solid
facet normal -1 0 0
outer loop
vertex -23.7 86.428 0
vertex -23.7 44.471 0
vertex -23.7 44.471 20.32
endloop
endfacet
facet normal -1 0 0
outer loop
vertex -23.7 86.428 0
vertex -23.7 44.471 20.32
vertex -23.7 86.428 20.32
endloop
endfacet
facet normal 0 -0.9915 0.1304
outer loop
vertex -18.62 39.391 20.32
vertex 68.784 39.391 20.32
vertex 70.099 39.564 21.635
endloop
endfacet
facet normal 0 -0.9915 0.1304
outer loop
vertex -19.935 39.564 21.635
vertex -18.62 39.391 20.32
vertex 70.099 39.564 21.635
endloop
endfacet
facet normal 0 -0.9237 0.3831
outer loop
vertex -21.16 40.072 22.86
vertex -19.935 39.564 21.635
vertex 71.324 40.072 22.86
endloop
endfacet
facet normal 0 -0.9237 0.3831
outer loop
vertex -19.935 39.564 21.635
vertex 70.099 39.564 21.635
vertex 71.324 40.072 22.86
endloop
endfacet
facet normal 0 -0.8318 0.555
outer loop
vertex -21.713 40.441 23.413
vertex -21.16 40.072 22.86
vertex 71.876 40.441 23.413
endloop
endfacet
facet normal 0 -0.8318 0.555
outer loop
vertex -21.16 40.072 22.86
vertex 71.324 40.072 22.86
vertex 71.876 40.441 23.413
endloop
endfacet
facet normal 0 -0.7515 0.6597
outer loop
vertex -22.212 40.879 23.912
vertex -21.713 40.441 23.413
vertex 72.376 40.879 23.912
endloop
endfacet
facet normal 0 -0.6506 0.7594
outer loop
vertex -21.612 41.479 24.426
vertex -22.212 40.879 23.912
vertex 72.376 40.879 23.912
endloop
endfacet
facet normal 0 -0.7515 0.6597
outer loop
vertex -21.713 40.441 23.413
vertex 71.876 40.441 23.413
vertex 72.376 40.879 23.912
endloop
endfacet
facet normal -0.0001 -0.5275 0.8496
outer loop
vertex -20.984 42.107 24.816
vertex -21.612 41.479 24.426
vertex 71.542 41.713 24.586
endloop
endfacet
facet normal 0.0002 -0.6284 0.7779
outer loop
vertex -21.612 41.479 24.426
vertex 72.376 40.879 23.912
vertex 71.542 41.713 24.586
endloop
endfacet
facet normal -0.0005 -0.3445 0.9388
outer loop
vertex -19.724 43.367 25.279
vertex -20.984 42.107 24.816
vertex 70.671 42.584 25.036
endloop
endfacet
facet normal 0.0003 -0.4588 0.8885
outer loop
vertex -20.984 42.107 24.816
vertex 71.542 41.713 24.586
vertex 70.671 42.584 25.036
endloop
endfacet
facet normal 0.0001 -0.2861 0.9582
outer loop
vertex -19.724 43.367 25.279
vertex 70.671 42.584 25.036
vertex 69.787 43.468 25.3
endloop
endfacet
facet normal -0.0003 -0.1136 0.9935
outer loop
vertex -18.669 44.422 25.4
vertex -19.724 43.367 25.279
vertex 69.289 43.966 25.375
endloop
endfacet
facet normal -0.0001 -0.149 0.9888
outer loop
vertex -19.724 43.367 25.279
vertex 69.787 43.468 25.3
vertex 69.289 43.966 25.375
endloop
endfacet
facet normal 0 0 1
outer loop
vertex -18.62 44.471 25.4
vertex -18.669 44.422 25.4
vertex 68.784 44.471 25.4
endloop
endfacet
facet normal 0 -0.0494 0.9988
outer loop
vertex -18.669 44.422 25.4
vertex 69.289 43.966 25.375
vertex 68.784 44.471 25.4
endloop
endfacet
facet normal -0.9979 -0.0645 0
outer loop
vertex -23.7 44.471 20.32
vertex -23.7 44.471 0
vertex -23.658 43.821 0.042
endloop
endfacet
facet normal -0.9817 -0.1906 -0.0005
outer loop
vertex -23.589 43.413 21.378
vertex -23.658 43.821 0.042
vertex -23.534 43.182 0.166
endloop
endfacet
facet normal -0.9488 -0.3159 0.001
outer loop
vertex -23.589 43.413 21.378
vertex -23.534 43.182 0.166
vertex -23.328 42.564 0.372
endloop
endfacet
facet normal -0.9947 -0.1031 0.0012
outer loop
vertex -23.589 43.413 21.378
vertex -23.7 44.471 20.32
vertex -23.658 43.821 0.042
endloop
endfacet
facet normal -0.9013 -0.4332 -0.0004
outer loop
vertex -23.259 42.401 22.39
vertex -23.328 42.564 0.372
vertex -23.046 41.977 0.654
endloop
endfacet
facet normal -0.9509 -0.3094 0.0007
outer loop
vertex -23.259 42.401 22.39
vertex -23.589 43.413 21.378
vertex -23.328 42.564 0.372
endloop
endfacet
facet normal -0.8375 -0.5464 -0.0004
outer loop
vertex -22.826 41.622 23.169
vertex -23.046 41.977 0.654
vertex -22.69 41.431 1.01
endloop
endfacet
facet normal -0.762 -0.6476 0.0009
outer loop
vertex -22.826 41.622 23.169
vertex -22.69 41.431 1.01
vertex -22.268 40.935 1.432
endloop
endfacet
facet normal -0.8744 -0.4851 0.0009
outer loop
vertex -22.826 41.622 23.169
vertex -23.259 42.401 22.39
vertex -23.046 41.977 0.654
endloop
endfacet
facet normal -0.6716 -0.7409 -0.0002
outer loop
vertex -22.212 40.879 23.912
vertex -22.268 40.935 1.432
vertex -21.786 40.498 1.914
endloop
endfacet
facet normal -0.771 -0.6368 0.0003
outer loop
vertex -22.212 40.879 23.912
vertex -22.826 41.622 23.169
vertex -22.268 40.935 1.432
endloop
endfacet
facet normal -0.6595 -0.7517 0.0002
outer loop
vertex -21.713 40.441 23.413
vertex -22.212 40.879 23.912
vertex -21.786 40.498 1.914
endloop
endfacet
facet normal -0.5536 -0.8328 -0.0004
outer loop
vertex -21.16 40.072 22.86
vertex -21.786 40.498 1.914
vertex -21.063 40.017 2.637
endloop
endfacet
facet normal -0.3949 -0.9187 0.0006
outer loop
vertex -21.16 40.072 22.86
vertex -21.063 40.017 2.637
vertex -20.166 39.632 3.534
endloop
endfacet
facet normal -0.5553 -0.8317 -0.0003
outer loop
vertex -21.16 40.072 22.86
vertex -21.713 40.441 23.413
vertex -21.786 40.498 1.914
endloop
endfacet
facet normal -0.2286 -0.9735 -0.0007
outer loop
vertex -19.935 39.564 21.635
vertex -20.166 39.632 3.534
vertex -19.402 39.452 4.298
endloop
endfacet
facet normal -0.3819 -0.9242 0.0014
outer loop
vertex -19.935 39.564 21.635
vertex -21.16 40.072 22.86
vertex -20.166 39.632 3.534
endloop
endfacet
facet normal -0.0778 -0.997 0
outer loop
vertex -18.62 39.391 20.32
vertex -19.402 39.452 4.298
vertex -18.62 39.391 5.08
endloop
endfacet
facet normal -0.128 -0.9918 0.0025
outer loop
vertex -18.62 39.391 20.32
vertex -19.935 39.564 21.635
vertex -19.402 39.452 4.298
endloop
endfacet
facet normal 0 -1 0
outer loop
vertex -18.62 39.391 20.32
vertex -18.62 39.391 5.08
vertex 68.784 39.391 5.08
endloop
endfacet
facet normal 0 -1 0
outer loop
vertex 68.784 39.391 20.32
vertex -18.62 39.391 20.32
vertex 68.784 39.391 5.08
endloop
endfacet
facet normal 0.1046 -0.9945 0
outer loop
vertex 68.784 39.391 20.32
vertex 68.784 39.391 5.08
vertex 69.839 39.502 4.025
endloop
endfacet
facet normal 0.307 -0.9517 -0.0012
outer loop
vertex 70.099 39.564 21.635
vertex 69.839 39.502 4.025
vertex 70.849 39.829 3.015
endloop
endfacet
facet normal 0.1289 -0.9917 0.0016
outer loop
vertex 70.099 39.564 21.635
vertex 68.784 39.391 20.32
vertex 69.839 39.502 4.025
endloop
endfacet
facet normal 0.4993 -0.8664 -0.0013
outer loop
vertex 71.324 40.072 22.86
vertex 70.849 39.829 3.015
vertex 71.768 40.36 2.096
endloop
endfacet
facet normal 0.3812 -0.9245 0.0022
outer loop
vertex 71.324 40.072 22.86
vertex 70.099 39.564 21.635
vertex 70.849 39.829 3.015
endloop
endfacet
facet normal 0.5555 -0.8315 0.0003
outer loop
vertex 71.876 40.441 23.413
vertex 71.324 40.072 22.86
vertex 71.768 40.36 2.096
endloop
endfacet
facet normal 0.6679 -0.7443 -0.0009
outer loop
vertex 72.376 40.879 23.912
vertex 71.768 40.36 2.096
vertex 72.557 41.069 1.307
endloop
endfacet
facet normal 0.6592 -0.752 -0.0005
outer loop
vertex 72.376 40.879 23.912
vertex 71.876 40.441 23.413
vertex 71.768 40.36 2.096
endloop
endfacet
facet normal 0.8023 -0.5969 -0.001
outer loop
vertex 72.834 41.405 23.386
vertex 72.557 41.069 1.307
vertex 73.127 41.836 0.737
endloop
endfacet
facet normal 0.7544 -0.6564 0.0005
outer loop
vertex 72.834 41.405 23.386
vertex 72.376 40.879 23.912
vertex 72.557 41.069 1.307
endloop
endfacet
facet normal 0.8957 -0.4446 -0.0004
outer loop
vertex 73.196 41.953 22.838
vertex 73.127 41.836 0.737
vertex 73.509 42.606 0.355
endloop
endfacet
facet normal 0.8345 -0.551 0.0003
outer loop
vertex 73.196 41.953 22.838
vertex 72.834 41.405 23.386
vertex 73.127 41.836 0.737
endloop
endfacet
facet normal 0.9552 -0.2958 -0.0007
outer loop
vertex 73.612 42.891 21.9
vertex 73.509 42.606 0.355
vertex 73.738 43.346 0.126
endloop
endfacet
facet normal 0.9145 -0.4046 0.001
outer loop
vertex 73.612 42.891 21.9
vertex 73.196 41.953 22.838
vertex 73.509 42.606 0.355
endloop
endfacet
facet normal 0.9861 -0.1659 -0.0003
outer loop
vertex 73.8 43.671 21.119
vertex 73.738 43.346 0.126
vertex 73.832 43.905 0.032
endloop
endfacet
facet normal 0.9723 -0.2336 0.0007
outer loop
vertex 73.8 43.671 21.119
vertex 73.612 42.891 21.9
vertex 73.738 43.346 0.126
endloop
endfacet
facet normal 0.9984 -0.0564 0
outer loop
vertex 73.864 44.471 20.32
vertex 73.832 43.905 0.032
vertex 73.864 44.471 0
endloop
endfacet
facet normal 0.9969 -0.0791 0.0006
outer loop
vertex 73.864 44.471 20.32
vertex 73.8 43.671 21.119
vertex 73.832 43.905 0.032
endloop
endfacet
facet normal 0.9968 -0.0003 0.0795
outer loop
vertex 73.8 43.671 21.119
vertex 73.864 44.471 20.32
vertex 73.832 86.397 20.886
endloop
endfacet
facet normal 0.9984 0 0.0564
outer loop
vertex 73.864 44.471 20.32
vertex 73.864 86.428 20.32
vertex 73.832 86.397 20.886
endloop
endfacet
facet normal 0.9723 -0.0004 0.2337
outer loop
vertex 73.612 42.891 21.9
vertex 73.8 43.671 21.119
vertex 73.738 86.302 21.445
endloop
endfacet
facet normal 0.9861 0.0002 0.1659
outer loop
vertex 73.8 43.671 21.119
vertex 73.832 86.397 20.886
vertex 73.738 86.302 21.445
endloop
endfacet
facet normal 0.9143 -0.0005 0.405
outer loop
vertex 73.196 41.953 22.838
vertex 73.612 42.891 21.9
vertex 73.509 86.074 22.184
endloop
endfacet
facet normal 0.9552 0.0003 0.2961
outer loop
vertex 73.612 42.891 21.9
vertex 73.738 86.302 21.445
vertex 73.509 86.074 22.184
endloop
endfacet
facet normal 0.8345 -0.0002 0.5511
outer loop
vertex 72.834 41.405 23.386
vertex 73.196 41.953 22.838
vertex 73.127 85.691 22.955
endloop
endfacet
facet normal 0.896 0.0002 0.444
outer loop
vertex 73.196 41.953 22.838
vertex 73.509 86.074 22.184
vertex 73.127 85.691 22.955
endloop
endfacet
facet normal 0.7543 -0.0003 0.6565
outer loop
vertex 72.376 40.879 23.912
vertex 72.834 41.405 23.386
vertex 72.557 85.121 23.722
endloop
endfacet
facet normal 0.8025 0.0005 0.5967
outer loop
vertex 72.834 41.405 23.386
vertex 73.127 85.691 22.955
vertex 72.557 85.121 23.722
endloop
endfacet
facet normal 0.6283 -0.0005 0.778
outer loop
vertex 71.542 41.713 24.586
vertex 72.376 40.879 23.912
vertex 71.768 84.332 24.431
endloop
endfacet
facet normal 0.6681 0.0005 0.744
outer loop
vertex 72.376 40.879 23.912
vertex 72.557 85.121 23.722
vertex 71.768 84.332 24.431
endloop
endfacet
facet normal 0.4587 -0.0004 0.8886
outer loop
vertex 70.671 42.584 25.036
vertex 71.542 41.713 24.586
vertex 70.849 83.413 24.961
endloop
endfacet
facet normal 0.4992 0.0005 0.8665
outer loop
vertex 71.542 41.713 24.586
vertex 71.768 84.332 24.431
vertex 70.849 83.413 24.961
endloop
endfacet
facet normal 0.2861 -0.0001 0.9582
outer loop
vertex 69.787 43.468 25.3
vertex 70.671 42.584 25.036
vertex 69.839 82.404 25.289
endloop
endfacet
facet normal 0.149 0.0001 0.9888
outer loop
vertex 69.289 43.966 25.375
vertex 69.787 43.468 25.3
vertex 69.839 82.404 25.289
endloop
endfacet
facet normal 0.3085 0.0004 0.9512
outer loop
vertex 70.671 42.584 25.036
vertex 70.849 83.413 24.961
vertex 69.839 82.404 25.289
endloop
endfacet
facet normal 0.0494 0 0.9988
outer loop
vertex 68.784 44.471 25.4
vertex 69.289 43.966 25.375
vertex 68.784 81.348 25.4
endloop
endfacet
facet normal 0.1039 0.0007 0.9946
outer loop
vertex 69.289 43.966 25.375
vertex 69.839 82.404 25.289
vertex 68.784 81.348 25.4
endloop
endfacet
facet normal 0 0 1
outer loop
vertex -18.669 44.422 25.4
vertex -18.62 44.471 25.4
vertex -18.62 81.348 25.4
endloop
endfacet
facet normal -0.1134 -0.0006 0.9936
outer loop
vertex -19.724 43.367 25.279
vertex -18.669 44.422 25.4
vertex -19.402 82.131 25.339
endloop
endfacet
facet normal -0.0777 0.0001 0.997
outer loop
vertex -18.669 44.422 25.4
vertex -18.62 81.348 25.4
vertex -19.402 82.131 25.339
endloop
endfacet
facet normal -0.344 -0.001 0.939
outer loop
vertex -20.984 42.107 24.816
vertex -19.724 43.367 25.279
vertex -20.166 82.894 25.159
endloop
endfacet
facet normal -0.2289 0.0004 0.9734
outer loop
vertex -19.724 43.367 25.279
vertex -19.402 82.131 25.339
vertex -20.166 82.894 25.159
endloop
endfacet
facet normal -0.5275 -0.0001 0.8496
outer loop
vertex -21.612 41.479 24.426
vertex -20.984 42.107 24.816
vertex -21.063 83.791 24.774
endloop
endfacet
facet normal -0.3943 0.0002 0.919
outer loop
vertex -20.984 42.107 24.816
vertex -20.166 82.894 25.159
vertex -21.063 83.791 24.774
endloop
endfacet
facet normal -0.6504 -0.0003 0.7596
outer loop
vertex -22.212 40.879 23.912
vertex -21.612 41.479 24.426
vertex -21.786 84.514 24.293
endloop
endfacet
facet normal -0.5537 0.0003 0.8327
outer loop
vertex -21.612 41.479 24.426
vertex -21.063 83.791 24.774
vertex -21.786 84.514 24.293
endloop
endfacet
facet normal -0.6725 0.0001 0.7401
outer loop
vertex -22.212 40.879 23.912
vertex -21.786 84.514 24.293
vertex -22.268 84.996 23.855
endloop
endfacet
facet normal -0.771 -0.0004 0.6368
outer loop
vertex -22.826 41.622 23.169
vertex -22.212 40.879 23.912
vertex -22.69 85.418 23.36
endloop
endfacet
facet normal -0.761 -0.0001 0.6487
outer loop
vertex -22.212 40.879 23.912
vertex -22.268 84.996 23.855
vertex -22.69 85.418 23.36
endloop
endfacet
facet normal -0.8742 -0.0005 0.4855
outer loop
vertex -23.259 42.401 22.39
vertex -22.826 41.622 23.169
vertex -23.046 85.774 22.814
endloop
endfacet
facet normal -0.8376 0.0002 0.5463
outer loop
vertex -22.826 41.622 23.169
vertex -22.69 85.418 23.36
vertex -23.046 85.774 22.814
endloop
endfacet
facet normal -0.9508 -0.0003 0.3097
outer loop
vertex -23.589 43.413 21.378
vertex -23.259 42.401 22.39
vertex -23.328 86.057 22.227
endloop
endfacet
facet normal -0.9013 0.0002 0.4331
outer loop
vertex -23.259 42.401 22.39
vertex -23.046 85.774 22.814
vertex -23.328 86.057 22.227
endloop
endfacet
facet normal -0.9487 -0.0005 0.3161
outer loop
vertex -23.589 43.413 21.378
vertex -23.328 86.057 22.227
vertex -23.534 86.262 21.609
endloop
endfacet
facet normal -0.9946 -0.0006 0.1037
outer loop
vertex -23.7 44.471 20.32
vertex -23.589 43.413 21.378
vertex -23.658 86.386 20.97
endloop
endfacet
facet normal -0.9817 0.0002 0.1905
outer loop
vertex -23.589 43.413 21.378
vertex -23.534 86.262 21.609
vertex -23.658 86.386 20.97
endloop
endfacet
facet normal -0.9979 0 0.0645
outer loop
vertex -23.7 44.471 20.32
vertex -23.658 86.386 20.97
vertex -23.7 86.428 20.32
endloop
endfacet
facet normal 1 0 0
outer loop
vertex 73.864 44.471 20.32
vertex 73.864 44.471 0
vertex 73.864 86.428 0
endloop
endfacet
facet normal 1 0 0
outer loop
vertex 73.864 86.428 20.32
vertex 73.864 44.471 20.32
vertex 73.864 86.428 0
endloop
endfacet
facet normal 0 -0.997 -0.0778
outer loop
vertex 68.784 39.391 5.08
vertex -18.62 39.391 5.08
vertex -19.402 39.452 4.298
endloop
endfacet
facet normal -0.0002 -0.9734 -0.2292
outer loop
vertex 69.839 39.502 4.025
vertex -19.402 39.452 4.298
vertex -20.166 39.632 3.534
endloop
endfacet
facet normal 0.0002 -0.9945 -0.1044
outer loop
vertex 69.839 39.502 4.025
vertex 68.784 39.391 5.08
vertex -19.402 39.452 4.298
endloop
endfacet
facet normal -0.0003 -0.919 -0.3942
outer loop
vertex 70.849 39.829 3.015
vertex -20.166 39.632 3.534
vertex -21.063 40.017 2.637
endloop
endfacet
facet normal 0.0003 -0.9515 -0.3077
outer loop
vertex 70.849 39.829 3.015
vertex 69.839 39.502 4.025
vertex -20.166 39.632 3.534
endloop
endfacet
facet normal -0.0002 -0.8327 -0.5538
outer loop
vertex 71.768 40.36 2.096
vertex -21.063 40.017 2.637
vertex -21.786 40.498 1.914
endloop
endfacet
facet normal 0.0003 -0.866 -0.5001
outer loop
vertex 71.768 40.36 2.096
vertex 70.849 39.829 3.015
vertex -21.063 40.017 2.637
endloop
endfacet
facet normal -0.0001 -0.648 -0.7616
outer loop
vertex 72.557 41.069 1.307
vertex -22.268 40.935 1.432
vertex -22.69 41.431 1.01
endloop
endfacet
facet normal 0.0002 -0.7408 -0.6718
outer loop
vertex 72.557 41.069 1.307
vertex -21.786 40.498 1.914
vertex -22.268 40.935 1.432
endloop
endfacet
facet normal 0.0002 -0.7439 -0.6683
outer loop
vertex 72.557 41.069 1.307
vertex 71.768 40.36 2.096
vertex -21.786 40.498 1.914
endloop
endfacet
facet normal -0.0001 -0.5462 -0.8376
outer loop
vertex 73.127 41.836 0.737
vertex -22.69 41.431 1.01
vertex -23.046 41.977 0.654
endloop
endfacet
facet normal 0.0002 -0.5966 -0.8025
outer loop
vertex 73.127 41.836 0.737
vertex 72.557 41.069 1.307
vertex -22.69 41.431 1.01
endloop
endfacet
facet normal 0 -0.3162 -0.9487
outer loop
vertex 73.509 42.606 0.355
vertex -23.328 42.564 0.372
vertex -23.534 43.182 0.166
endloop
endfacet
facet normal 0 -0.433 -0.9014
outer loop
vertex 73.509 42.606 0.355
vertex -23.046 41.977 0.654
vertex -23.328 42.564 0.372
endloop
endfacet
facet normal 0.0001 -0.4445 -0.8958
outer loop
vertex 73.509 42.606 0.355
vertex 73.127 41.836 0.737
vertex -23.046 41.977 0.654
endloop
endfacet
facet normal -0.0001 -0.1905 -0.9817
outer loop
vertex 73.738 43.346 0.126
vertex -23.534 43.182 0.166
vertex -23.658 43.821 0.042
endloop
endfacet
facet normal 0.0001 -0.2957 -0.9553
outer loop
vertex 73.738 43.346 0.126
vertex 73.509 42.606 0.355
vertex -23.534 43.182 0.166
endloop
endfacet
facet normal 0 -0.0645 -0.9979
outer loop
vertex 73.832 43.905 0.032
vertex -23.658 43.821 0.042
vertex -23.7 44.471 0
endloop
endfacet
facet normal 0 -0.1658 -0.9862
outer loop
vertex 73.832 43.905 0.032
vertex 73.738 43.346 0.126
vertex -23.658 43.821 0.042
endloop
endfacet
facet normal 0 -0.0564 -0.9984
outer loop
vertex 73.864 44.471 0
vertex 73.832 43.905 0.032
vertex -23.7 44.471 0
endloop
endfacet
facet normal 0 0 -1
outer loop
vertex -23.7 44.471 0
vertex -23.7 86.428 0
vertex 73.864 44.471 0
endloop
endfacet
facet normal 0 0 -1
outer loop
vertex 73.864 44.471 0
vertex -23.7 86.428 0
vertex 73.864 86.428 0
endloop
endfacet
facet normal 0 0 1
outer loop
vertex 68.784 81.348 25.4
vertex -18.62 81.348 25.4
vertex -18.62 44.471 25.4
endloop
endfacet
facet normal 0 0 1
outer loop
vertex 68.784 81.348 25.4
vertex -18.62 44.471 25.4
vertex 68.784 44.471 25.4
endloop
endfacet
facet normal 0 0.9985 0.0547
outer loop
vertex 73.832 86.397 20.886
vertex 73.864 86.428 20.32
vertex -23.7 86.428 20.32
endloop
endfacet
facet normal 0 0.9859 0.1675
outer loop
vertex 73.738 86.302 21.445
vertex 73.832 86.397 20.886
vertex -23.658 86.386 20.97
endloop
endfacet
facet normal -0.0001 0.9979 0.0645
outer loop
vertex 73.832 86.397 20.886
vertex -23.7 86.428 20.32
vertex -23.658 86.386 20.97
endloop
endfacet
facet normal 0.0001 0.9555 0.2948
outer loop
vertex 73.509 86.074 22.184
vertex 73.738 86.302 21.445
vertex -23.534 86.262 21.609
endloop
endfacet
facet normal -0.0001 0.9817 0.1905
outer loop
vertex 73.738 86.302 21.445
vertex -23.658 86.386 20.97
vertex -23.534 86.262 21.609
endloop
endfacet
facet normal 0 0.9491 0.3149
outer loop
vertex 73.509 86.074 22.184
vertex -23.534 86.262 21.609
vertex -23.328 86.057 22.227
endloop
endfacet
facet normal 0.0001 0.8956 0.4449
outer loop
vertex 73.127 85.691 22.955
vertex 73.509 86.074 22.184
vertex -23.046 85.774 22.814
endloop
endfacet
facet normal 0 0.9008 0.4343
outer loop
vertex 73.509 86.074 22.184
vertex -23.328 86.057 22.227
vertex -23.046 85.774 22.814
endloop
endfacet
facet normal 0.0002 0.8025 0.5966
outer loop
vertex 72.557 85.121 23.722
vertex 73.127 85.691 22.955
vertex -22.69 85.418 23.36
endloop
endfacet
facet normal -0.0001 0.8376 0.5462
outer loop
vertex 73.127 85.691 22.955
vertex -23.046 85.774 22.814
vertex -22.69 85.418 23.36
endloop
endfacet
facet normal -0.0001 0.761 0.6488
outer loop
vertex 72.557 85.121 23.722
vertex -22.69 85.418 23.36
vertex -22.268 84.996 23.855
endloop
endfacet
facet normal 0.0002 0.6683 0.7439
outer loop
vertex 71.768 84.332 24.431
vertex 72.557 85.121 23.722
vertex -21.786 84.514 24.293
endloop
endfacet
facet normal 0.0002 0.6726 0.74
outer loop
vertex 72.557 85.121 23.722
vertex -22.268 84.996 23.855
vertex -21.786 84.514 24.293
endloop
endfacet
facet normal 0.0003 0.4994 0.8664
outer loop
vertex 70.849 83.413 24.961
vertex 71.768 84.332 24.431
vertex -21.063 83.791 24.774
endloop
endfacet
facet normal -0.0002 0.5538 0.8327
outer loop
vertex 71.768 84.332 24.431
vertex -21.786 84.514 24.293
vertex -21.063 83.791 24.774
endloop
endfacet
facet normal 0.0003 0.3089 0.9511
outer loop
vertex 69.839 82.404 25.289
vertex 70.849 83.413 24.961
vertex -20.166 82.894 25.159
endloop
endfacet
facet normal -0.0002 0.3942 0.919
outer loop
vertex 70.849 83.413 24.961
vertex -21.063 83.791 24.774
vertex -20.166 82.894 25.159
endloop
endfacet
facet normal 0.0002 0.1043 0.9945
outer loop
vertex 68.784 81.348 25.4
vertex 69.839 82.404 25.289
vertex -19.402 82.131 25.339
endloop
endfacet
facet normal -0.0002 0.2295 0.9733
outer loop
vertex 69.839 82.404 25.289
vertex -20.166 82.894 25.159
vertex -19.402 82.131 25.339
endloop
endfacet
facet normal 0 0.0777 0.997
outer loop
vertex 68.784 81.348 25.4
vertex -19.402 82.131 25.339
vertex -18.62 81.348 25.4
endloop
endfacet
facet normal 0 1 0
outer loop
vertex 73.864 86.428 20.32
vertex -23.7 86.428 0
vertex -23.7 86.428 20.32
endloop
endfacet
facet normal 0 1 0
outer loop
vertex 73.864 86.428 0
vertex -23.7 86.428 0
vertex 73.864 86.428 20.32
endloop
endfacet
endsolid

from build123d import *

# Parameters (mm, degrees)
F0_W        = 97.5638087839
F0_H        = 47.0372922719
F1_DEPTH    = 25.4
F2_R        = 5.08
F3_T1_DEPTH = 67.3572922719
F3_T3_DEPTH = 122.9638087839


# Not quite as in the source:
# - a fillet or chamfer that OpenCascade refuses, or shapes differently, is made with other operations: its cross-section is extruded or revolved along the edge and cut away or added


with BuildPart() as f1:
    # F0 (on Top) → F1 (new body)
    with BuildSketch(Plane.XY):
        with Locations((25.0818403438, 62.9095640033)):
            Rectangle(F0_W, F0_H)
    extrude(amount=F1_DEPTH)

    # F2
    f2_edges = [f1.edges().sort_by_distance(p)[0] for p in [
        (73.863745, 39.390918, 12.7),
        (25.08184, 39.390918, 25.4),
        (-23.700064, 39.390918, 12.7),
        (25.08184, 39.390918, 0),
    ]]
    fillet(f2_edges, radius=F2_R)

    # F3: fillet of radius 5.08 on 8 edges, made by hand

    # F3_s2 → F3_t1 (cut)
    with BuildSketch(Plane.XZ.offset(-99.1282101393)):
        with BuildLine():
            ThreePointArc((73.8637447357, 20.32), (72.3758471841, 23.9121024484), (68.7837447357, 25.4))
            Line((68.7837447357, 25.4), (73.8637447357, 25.4))
            Line((73.8637447357, 25.4), (73.8637447357, 20.32))
        make_face()
        with BuildLine():
            ThreePointArc((-18.6200640482, 25.4), (-22.2121664966, 23.9121024484), (-23.7000640482, 20.32))
            Line((-23.7000640482, 20.32), (-23.7000640482, 25.4))
            Line((-23.7000640482, 25.4), (-18.6200640482, 25.4))
        make_face()
    extrude(amount=F3_T1_DEPTH, mode=Mode.SUBTRACT)

    # F3_s4 → F3_t3 (cut)
    with BuildSketch(Plane.YZ.offset(-36.4000640482)):
        with BuildLine():
            ThreePointArc((86.4282101393, 20.32), (84.9403125877, 23.9121024484), (81.3482101393, 25.4))
            Line((81.3482101393, 25.4), (86.4282101393, 25.4))
            Line((86.4282101393, 25.4), (86.4282101393, 20.32))
        make_face()
    extrude(amount=F3_T3_DEPTH, mode=Mode.SUBTRACT)


solid = f1.part
